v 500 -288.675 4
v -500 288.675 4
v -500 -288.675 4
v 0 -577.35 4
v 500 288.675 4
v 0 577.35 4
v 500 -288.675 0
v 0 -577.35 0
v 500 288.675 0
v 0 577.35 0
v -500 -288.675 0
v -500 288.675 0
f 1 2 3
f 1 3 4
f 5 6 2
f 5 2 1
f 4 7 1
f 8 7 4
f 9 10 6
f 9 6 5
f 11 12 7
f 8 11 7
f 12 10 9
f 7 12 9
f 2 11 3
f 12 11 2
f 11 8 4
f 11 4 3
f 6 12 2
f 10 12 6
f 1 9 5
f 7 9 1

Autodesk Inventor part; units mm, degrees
ref_plane "YZ Plane" through (0, 0, 0) normal (1, 0, 0) x (0, 1, 0)
ref_plane "XZ Plane" through (0, 0, 0) normal (0, 1, 0) x (-1, 0, 0)
ref_plane "Work Plane1" through (0, 0, 0) normal (0, 0, 1) x (1, 0, 0)
sketch "Sketch1" plane through (0, 0, 0) normal (0, 0, 1) x (1, 0, 0)
  line L0 (500, -288.6751) -> (0, -577.3503)
  line L1 (0, -577.3503) -> (-500, -288.6751)
  line L2 (-500, -288.6751) -> (-500, 288.6751)
  line L3 (-500, 288.6751) -> (0, 577.3503)
  line L4 (0, 577.3503) -> (500, 288.6751)
  line L5 (500, 288.6751) -> (500, -288.6751)
  point P0 (0, 0)
  point P1 (0, 0)
  point P2 (0, 0)
  dimension "d1" = 500
extrude "Extrusion1" add sketch "Sketch1" along normal blind 4
properties part number "Top" material "Glass"
